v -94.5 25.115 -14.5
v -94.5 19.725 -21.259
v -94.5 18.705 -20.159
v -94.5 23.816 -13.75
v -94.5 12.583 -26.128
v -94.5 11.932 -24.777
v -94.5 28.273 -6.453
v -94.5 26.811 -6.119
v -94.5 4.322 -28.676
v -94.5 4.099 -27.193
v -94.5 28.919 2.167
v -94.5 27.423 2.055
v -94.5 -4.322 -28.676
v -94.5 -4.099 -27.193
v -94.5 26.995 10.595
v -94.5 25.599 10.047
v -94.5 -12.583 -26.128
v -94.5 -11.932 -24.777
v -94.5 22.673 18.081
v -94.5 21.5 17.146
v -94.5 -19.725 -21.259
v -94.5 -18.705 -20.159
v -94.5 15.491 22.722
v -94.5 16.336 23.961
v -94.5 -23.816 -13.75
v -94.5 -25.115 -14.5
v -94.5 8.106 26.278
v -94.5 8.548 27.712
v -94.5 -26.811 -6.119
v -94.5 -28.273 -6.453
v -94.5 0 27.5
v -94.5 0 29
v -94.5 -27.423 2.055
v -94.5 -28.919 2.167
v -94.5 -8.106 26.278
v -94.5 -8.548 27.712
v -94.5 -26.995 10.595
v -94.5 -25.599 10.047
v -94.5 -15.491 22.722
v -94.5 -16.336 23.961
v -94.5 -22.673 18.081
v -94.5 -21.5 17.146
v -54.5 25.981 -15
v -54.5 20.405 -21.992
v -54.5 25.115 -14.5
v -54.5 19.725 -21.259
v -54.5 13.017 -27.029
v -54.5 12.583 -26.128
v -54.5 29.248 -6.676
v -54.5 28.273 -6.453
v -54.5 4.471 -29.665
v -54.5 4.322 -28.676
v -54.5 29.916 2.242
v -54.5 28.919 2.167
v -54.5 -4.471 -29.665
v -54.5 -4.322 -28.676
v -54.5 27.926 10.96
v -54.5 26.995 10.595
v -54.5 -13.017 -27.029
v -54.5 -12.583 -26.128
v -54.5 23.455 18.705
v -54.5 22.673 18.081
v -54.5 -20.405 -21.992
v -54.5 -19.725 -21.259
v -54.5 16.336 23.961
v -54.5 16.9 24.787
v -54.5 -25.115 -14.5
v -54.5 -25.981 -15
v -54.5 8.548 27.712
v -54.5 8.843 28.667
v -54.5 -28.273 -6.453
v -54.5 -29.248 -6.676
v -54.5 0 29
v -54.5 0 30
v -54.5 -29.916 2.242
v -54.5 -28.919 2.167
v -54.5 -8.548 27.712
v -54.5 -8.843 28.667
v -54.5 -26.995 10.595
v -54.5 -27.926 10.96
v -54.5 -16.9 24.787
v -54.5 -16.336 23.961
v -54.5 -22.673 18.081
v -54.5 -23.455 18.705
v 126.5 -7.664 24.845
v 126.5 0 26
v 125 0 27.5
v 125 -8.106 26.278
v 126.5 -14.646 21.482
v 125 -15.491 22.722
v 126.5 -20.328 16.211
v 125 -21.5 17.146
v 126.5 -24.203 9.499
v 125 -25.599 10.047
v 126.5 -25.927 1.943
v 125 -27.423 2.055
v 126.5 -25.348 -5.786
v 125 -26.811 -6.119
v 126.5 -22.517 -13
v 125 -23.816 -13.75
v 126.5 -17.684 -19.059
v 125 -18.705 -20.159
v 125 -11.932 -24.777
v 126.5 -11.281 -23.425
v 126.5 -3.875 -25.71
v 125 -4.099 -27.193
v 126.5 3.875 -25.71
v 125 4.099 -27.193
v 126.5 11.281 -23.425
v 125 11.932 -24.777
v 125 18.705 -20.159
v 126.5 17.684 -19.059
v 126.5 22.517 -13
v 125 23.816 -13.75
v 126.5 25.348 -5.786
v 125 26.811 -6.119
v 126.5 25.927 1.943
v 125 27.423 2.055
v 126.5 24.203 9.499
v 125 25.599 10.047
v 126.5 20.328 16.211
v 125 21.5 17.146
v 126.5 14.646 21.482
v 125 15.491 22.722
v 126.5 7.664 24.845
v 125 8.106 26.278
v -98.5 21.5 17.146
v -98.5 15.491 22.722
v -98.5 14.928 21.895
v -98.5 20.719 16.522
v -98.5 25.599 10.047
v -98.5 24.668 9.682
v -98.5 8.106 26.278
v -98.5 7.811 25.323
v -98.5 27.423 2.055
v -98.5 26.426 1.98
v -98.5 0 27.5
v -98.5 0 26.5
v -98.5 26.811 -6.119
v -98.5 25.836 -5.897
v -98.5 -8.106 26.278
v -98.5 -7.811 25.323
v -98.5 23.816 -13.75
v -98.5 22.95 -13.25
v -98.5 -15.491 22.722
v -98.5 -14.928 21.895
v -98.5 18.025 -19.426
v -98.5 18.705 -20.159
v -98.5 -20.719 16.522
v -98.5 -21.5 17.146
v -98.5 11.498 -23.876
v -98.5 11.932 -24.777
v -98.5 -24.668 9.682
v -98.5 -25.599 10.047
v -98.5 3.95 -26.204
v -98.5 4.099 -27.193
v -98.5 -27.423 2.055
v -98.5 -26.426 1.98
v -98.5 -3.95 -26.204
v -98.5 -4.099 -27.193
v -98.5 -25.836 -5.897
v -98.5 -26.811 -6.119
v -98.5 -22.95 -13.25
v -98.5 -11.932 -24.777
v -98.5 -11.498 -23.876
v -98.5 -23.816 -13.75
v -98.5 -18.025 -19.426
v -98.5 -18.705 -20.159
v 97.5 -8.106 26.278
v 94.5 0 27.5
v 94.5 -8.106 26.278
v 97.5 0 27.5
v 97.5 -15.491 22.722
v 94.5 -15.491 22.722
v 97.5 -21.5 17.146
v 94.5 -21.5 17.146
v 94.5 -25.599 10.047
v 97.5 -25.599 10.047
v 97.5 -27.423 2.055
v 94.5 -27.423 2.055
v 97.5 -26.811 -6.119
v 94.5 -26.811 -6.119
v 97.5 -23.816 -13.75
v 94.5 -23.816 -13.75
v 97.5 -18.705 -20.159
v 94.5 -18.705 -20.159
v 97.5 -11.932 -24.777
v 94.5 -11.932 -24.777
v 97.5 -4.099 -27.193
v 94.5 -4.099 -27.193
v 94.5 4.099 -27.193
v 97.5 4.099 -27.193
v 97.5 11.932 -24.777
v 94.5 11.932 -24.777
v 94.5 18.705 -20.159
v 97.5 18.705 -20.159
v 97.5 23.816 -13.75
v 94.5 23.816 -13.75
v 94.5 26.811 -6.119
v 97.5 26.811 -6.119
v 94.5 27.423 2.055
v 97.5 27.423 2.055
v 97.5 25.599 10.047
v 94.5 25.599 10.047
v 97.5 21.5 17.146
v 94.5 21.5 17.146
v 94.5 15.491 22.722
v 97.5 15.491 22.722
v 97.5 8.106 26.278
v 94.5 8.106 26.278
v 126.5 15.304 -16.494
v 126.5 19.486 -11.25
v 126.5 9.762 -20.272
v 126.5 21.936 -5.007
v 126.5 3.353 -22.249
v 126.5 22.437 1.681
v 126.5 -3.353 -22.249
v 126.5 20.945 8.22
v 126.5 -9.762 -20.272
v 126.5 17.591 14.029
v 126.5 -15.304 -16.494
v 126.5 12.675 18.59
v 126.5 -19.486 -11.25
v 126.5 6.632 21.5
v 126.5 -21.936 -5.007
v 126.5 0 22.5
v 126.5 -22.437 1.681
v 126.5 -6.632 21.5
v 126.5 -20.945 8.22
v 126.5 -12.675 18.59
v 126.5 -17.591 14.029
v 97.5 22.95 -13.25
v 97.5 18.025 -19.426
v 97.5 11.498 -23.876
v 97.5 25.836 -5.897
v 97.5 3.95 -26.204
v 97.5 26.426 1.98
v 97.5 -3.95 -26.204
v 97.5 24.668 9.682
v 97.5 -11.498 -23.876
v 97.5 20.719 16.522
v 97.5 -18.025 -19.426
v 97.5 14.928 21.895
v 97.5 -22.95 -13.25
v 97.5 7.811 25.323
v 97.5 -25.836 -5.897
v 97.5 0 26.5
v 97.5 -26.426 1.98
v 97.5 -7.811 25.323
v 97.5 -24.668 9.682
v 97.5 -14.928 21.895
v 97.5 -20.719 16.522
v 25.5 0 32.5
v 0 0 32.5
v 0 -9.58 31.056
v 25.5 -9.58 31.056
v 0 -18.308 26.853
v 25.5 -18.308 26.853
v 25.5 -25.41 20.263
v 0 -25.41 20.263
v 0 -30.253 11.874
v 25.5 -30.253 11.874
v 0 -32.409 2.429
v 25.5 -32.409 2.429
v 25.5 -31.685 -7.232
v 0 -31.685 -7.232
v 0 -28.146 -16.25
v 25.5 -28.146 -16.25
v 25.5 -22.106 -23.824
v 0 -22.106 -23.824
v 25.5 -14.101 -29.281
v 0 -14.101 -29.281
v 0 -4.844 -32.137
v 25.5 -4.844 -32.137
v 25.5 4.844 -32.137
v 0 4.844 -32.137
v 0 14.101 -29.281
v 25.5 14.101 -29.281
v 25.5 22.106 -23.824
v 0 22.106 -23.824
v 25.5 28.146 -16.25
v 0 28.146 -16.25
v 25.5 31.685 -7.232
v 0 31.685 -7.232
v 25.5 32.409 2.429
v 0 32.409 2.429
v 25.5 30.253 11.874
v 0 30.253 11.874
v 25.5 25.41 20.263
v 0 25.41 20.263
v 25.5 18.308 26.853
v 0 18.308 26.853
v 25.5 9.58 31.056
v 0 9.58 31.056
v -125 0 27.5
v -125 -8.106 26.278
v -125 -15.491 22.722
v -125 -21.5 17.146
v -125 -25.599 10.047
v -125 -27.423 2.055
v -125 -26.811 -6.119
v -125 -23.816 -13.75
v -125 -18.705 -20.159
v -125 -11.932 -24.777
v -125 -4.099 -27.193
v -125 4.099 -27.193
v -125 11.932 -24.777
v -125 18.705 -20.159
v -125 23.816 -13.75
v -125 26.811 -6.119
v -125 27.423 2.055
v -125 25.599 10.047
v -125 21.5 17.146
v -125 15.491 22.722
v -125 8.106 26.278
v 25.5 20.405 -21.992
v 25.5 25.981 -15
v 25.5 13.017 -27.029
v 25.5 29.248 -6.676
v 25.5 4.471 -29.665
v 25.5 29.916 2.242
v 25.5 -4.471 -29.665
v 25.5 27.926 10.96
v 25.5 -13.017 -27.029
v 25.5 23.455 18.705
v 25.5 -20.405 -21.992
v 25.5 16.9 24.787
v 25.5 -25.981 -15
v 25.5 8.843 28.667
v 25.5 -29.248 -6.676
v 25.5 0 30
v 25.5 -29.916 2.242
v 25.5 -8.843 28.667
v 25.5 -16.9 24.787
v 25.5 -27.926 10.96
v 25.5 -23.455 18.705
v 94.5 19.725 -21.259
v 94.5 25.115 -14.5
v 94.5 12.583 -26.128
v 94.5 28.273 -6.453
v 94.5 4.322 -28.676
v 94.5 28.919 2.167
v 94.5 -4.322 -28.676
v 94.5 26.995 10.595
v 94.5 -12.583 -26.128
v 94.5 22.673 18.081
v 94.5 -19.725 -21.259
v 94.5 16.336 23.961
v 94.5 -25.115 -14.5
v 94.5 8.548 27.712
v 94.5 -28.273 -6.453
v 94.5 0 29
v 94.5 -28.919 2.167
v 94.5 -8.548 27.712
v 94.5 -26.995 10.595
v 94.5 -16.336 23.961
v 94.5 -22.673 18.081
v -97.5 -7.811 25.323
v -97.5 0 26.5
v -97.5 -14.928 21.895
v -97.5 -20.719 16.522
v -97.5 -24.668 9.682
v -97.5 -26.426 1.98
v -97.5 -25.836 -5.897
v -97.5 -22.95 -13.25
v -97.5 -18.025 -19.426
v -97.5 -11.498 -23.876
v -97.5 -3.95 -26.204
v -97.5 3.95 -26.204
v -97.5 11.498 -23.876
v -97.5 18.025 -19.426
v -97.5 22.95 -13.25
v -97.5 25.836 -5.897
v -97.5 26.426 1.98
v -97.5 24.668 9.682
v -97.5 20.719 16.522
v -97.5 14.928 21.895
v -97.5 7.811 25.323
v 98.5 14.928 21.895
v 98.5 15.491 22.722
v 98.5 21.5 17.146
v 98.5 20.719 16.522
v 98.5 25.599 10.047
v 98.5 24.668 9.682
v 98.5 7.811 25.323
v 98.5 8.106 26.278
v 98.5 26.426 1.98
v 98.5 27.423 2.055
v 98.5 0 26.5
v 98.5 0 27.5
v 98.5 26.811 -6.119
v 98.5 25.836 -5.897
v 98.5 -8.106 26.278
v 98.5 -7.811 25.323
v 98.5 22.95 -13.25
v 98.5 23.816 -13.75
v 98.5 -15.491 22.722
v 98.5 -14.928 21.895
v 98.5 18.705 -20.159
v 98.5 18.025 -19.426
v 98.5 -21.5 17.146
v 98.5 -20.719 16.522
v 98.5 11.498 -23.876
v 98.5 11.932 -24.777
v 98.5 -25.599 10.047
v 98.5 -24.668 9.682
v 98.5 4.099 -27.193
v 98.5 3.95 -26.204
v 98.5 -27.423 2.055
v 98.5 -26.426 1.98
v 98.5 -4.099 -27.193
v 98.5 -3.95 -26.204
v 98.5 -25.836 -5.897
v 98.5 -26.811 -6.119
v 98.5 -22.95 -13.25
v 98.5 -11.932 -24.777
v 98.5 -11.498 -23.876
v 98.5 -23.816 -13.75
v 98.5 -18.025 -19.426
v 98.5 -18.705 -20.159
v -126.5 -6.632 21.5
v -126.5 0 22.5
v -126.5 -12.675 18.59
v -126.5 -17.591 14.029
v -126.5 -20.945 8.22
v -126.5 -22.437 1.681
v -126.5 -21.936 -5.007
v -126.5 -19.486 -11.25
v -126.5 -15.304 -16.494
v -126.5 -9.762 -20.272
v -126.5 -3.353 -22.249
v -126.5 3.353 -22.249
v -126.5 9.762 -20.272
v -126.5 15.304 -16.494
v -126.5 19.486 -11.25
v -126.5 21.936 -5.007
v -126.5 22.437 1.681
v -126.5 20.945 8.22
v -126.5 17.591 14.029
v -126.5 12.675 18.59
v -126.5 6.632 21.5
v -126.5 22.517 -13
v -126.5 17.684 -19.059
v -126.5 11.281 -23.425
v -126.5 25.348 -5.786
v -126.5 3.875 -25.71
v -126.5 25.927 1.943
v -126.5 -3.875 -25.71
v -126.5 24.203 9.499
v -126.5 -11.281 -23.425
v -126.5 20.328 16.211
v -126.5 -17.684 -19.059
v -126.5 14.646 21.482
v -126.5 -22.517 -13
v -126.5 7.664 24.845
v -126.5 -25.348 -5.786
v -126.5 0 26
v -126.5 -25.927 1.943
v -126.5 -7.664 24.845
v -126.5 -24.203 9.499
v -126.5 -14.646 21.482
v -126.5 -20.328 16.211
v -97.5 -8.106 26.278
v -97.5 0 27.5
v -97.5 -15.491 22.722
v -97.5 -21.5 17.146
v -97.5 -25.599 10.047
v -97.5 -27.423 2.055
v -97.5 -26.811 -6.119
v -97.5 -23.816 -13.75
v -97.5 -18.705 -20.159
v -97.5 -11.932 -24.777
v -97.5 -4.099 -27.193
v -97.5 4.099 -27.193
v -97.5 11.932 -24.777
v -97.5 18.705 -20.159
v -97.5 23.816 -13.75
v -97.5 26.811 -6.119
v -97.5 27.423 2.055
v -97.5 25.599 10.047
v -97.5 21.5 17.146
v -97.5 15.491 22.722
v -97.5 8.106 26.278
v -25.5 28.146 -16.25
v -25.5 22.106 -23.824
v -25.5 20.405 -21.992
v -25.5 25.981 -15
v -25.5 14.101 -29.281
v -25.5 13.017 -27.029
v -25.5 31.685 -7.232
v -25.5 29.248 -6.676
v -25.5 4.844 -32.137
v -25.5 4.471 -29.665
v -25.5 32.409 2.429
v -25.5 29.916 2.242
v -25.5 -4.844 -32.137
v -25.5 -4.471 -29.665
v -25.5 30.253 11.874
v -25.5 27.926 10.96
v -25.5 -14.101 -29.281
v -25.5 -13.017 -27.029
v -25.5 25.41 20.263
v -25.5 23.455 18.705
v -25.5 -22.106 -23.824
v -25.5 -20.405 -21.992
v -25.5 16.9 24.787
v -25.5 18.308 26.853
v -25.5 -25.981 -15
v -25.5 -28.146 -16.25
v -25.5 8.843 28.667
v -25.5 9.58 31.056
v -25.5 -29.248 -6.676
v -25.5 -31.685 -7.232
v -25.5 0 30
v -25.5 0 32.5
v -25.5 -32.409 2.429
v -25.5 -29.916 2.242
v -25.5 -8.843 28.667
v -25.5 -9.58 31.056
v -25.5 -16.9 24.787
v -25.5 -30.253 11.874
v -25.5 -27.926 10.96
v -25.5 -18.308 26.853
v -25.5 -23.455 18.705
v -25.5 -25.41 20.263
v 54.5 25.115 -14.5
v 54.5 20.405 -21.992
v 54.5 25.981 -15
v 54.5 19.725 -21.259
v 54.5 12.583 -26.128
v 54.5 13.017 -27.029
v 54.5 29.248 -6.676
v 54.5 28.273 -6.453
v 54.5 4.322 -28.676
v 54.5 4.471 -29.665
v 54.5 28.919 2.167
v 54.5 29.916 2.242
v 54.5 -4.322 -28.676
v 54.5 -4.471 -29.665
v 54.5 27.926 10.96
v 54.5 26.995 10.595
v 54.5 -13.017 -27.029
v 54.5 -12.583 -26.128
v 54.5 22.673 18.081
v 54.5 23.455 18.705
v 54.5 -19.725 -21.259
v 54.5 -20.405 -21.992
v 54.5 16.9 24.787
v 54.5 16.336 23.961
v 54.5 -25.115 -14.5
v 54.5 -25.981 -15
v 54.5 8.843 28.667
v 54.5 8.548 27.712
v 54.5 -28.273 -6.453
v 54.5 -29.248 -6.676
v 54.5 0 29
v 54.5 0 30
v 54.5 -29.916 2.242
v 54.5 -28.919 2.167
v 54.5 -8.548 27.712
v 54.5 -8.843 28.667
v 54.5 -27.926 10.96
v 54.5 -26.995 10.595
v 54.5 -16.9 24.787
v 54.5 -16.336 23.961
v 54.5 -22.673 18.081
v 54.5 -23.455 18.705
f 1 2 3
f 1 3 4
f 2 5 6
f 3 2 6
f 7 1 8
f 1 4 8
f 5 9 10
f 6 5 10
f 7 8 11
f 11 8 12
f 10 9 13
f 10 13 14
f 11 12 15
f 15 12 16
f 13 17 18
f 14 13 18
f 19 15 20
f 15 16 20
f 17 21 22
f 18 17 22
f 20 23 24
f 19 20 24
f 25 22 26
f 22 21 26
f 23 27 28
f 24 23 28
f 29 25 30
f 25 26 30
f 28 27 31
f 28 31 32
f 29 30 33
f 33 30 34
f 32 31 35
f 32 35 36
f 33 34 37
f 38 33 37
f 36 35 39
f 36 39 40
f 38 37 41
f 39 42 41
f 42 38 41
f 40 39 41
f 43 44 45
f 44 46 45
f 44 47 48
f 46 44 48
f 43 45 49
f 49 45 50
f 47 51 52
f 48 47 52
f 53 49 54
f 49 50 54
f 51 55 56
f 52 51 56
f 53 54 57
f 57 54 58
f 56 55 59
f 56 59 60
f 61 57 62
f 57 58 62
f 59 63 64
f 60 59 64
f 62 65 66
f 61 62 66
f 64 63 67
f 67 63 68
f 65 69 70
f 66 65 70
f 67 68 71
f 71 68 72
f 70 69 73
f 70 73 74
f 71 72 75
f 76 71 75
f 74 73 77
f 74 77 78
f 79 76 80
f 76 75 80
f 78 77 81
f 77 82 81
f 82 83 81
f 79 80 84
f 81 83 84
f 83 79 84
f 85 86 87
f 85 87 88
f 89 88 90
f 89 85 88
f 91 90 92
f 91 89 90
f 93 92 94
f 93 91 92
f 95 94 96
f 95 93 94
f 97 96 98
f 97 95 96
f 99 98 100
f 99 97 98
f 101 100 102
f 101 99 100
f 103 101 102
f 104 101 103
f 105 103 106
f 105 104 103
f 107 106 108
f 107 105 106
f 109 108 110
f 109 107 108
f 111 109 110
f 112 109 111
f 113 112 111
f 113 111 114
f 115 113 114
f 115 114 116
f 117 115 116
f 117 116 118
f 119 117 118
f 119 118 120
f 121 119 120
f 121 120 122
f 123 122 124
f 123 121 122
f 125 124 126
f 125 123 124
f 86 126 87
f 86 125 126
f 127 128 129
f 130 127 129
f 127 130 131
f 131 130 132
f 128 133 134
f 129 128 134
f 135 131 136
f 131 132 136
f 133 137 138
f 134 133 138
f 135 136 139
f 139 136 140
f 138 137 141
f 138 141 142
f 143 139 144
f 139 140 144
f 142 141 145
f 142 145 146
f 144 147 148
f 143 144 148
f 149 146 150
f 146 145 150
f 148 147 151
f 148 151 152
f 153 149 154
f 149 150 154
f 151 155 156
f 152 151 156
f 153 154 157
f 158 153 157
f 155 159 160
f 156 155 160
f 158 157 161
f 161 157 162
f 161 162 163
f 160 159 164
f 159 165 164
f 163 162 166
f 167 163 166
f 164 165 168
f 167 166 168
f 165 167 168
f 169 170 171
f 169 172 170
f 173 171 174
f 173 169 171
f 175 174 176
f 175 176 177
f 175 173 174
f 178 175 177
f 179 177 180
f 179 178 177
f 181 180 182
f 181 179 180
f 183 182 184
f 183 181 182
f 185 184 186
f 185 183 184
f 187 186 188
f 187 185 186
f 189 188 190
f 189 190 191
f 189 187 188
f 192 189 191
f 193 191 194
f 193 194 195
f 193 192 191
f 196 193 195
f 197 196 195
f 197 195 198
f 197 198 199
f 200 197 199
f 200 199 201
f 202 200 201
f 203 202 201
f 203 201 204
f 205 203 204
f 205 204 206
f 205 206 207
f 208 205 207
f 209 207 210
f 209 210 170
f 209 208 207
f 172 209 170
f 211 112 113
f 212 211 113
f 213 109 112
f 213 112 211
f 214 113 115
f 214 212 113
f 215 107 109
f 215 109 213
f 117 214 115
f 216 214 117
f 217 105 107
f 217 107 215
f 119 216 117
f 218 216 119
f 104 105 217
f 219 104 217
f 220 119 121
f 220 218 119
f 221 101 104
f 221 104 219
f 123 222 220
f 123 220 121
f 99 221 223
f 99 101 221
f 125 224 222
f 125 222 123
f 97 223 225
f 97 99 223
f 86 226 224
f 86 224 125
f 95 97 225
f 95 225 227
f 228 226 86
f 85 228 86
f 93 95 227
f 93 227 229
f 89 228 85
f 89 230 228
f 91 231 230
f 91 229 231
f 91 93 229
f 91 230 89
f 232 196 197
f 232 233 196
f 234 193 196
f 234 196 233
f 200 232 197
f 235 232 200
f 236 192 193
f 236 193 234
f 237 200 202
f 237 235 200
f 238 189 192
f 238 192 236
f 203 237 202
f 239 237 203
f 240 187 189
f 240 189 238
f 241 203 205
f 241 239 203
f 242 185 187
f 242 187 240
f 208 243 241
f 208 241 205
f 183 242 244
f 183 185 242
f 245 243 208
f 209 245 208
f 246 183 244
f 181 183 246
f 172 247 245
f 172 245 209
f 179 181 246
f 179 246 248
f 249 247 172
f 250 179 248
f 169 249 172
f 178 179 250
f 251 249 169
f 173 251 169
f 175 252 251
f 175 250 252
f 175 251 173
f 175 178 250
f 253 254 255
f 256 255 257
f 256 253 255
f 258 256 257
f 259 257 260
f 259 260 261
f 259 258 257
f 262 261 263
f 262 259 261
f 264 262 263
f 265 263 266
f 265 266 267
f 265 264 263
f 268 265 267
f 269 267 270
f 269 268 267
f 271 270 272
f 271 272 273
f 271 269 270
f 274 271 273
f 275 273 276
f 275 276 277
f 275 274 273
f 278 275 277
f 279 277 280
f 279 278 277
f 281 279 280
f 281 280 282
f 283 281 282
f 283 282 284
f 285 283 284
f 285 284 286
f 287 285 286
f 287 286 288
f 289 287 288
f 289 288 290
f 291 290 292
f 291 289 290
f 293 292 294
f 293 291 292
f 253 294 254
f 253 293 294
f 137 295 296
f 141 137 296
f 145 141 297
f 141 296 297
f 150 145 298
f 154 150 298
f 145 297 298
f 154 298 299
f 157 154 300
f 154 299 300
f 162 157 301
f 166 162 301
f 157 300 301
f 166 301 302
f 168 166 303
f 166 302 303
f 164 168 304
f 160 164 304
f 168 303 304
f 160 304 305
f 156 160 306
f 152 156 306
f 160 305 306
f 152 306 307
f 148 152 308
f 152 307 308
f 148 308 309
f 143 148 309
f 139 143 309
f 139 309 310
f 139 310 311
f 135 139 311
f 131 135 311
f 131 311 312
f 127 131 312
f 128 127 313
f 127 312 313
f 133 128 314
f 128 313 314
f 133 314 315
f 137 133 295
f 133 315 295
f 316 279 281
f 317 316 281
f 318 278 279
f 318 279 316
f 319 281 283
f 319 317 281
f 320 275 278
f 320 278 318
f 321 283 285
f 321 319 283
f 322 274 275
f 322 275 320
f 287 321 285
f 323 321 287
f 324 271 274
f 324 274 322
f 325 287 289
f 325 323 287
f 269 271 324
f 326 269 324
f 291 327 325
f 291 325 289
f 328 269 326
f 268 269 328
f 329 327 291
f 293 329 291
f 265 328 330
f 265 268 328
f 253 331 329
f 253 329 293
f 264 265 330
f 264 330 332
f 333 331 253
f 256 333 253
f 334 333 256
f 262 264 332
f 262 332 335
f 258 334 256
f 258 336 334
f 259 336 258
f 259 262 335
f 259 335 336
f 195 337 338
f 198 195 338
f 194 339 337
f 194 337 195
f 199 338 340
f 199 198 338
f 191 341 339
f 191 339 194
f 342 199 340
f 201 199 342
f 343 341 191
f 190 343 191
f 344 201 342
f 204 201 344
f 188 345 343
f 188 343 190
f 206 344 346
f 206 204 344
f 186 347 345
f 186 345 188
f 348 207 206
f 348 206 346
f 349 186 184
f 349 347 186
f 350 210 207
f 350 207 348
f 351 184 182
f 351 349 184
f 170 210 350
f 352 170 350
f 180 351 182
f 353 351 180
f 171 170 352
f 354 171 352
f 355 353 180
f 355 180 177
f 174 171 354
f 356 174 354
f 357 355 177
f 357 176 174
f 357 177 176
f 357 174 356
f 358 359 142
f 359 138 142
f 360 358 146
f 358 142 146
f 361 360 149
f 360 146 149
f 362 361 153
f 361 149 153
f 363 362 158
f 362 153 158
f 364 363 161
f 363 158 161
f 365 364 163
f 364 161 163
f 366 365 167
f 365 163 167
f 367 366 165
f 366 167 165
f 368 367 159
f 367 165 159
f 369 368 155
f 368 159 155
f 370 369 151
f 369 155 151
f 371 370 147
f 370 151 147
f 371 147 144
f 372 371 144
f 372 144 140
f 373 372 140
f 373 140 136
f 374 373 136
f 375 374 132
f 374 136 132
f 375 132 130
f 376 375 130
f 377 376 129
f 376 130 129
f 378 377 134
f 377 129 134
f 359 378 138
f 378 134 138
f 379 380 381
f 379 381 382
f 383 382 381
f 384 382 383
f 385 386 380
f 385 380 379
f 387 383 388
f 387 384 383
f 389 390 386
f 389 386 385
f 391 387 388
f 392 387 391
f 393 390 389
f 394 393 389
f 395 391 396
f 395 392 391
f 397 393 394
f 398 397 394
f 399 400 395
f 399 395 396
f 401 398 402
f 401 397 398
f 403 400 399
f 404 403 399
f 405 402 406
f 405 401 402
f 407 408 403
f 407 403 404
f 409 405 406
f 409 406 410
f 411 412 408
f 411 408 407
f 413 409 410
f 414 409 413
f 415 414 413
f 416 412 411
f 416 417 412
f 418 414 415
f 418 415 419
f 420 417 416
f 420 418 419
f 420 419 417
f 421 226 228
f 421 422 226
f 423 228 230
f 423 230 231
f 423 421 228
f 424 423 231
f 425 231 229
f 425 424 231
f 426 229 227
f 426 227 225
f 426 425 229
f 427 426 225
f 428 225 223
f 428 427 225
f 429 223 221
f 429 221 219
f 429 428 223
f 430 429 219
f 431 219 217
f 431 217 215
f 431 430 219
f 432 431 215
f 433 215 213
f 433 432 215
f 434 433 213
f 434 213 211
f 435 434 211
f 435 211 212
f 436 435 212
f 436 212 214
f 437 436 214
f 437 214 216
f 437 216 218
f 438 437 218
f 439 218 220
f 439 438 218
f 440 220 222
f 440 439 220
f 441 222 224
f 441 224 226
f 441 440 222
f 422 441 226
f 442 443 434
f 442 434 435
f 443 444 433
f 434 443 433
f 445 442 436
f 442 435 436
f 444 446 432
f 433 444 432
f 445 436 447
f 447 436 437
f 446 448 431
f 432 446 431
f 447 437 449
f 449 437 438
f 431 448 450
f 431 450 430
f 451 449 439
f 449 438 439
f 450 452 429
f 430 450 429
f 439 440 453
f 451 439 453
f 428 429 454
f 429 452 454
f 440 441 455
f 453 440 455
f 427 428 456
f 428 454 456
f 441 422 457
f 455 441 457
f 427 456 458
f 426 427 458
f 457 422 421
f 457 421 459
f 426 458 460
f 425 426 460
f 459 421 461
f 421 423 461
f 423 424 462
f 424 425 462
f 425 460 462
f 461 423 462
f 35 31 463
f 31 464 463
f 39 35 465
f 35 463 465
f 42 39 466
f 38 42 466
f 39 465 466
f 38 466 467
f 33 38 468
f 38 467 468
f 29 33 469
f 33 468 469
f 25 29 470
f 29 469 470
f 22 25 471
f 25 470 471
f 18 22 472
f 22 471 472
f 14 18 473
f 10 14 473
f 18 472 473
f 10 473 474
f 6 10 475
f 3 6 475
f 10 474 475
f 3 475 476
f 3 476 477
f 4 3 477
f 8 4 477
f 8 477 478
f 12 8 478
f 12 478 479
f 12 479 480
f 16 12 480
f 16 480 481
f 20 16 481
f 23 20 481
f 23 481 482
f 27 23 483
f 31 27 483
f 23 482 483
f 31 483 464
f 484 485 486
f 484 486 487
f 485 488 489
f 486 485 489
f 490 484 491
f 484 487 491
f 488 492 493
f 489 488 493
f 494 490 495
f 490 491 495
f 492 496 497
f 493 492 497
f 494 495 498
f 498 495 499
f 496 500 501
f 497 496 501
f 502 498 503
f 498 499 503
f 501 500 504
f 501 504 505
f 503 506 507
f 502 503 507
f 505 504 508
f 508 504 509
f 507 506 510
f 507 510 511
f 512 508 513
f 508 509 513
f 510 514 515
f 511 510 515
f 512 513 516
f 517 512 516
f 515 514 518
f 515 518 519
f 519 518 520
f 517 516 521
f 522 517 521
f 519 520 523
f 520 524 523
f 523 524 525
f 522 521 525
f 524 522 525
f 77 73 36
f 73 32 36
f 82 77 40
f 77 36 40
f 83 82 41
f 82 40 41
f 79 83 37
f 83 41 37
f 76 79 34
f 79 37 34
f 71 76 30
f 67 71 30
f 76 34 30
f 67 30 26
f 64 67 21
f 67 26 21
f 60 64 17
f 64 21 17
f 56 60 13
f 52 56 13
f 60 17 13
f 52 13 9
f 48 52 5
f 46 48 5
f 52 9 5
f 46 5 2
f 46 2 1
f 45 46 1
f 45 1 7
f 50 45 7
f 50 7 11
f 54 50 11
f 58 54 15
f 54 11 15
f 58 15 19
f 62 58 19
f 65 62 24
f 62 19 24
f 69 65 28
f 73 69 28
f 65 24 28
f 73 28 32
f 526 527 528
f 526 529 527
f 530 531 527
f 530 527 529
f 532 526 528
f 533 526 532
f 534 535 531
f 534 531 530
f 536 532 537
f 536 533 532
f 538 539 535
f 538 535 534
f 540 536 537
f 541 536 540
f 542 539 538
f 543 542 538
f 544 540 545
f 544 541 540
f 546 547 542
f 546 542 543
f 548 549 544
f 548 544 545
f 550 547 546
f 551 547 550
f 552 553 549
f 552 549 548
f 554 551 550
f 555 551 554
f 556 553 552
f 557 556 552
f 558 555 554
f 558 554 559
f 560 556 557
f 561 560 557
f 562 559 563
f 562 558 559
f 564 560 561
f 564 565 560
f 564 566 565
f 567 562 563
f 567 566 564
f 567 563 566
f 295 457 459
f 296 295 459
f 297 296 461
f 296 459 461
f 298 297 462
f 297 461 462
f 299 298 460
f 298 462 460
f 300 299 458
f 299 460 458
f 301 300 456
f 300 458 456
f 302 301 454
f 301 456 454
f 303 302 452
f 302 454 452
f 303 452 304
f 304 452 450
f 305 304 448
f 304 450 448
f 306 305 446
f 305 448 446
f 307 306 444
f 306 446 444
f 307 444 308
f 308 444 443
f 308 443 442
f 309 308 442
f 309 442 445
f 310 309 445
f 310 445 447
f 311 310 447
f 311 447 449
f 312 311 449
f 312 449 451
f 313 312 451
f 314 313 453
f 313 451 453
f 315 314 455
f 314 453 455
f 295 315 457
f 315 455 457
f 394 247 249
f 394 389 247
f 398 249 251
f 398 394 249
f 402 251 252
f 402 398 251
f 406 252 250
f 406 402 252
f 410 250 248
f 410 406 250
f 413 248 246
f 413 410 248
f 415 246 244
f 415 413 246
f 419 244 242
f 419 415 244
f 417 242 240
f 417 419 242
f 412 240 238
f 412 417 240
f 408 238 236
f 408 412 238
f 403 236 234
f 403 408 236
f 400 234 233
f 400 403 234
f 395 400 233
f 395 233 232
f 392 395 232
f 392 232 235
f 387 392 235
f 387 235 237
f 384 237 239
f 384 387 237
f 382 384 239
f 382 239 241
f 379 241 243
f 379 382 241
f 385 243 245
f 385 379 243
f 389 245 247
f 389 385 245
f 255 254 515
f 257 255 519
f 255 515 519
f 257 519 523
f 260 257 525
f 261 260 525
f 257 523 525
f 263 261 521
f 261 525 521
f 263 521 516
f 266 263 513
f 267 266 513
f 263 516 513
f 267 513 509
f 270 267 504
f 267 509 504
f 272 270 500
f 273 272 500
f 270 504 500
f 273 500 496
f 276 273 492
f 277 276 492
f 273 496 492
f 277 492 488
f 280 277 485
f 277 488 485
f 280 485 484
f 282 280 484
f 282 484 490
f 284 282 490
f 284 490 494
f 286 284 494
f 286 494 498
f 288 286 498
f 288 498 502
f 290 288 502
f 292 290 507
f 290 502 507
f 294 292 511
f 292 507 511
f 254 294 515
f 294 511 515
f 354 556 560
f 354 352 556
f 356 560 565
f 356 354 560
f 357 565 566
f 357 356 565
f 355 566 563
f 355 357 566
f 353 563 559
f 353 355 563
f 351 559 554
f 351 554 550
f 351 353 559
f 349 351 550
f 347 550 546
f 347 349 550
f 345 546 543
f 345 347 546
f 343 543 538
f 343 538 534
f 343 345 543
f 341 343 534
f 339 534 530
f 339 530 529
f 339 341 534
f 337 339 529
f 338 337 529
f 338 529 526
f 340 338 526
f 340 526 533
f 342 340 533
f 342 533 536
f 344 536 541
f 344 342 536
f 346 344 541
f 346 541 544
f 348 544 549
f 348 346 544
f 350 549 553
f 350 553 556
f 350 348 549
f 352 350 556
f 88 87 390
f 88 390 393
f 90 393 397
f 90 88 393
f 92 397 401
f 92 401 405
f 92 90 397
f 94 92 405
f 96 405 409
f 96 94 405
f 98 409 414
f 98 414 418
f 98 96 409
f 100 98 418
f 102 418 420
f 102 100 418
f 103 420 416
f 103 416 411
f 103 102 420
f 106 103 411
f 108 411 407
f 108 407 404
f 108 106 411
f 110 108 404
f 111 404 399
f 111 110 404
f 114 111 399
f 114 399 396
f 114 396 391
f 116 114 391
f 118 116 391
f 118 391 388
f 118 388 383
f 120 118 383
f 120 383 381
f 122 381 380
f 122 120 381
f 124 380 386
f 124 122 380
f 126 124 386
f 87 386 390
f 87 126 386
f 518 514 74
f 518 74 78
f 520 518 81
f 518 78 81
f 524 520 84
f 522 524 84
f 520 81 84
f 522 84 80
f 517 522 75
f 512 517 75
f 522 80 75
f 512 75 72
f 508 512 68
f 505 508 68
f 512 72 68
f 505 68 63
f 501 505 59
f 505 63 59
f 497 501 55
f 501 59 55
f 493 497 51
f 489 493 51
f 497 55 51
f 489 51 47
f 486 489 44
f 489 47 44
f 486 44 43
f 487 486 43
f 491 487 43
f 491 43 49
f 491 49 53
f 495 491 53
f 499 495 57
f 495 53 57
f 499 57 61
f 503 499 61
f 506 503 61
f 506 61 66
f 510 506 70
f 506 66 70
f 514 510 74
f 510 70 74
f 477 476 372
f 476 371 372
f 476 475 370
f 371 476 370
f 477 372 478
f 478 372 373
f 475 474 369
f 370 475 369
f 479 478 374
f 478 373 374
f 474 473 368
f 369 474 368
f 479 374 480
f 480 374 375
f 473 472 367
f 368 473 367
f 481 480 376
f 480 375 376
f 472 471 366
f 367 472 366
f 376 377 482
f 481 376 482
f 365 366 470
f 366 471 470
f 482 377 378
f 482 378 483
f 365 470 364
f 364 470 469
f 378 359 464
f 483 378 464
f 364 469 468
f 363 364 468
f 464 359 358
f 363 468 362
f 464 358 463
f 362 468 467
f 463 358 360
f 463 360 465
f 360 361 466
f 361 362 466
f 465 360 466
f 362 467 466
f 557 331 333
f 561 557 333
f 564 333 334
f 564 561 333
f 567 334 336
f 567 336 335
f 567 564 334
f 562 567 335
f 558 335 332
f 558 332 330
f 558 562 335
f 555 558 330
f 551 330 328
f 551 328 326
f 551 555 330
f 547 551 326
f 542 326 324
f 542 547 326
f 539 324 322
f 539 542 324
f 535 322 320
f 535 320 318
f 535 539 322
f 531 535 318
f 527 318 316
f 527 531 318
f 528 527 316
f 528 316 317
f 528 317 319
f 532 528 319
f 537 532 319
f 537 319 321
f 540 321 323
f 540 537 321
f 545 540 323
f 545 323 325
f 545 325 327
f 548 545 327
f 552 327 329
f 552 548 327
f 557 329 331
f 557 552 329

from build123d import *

# Parameters (mm, degrees)
CHAMFER1_SIZE = 1.5


with BuildPart() as part:
    # Sketch1 → Revolve1 (revolve)
    with BuildSketch(Plane.XY, mode=Mode.PRIVATE) as revolve1_sk:
        Polygon((0, 32.5), (-25.5, 32.5), (-25.5, 30), (-54.5, 30), (-54.5, 29), (-94.5, 29), (-94.5, 27.5), (-97.5, 27.5), (-97.5, 26.5), (-98.5, 26.5), (-98.5, 27.5), (-126.5, 27.5), (-126.5, 22.5), (0, 22.5), align=None)
    revolve1 = revolve(revolve1_sk.sketch.rotate(Axis((0, 0, 0), (1, 0, 0)), 90), axis=Axis((0, 0, 0), (1, 0, 0)))

    # Mirror1: Revolve1 across plane
    add(revolve1.mirror(Plane(origin=(0, 0, 0), x_dir=(0, 0, 1), z_dir=(1, 0, 0))))

    # Chamfer1
    chamfer1_edges = [part.edges().sort_by_distance(p)[0] for p in [
        (-126.5, 0, -27.5),
        (126.5, 0, -27.5),
    ]]
    chamfer(chamfer1_edges, length=CHAMFER1_SIZE)


solid = part.part
